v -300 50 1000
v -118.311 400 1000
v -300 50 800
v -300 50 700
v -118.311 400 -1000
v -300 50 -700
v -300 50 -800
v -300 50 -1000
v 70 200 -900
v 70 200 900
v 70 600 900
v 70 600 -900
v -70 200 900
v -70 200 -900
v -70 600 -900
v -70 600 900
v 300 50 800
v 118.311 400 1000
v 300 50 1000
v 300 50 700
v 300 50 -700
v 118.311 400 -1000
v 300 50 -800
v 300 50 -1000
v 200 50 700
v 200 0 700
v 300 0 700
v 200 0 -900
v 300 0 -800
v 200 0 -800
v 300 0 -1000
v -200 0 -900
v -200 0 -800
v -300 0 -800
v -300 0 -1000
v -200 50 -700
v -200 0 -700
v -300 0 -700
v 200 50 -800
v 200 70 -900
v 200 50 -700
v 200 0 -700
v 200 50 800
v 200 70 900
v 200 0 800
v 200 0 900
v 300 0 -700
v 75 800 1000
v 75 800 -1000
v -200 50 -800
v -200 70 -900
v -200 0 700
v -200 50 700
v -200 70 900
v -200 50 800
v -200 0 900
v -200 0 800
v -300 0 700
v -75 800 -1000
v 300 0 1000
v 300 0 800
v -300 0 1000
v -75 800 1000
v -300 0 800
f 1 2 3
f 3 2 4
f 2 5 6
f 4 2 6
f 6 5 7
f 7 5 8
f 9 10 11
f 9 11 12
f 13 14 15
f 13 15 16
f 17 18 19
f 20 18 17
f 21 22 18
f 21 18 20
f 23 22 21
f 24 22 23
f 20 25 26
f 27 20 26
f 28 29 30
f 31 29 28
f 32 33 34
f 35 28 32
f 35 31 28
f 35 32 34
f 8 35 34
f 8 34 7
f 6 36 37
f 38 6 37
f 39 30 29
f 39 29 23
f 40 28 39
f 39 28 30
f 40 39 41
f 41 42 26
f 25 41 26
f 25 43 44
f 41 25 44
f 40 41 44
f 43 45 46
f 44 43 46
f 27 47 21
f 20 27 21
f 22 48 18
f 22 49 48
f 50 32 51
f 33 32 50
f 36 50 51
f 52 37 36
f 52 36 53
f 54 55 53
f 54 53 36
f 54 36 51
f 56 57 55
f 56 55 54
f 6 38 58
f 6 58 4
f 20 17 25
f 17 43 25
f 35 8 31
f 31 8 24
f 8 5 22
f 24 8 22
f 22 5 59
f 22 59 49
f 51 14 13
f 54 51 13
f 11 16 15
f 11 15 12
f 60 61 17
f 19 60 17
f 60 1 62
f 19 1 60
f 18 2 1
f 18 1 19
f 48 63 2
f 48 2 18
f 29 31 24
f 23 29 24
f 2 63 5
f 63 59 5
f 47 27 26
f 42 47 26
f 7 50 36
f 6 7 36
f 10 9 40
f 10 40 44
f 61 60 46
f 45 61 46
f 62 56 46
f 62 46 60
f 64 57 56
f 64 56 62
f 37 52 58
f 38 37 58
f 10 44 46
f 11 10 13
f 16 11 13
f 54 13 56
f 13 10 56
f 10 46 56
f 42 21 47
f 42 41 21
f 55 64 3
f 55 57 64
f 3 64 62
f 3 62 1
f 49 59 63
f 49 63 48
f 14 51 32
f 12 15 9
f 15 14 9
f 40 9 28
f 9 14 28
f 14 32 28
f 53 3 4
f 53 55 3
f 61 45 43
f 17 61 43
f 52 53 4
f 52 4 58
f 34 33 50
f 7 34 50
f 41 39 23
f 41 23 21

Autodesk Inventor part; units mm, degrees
ref_plane "YZ Plane" through (0, 0, 0) normal (1, 0, 0) x (0, 1, 0)
ref_plane "XZ Plane" through (0, 0, 0) normal (0, 1, 0) x (-1, 0, 0)
ref_plane "XY Plane" through (0, 0, 0) normal (0, 0, 1) x (1, 0, 0)
sketch "Sketch1" plane through (0, 0, 0) normal (0, 0, 1) x (1, 0, 0)
  line L0 (0, 0) -> (0, 800) construction
  line L1 (0, 800) -> (-75, 800)
  line L2 (-300, 0) -> (-300, 50)
  line L3 (-75, 800) -> (-118.3113, 400)
  line L4 (-118.3113, 400) -> (-300, 50)
  line L5 (0, 800) -> (75, 800)
  line L6 (300, 0) -> (300, 50)
  line L7 (75, 800) -> (118.3113, 400)
  line L8 (118.3113, 400) -> (300, 50)
  line L9 (300, 0) -> (-300, 0)
  dimension "d28" = 800
extrude "Extrusion1" add sketch "Sketch1" along normal mid plane 2000
sketch "Sketch5" plane through (-300, 0, 1000) normal (0, -1, 0) x (1, 0, 0)
  line L0 (0, -2000) -> (181.6887, -2000) projected
  line L1 (0, -2000) -> (0, 0) projected
  line L2 (100, -1900) -> (100, -100)
  line L3 (181.6887, -2000) -> (181.6887, 0) projected
  line L4 (100, -1900) -> (500, -1900)
  line L5 (600, -2000) -> (600, 0) projected
  line L6 (500, -1900) -> (500, -100)
  line L7 (500, -100) -> (100, -100)
  point P0 (300, -1000)
  dimension "d35" = 1800
extrude "Extrusion5" cut sketch "Sketch5" against normal blind 200
chamfer "Chamfer1" distance 130 angle 45 2 edges at (200, 200, 0) (-200, 200, 0)
sketch "Sketch6" plane through (-300, 200, 1000) normal (0, -1, 0) x (1, 0, 0)
  line L0 (370, -100) -> (370, -1900) projected
  line L1 (370, -100) -> (370, -1900)
  line L2 (230, -1900) -> (230, -100) projected
  line L3 (370, -1900) -> (230, -1900)
  line L4 (230, -1900) -> (230, -100)
  line L5 (230, -100) -> (370, -100)
  point P0 (300, -1000)
extrude "Extrusion6" cut sketch "Sketch6" against normal blind 400
sketch "Sketch7" plane through (200, 0, -900) normal (-1, 0, 0) x (0, 0, 1)
  line L0 (0, 0) -> (0, 70) projected
  line L1 (0, 0) -> (100, 0)
  line L2 (1800, 0) -> (0, 0) projected
  line L3 (100, 0) -> (100, 50)
  line L4 (100, 50) -> (200, 50)
  line L5 (200, 50) -> (200, 0)
  line L6 (200, 0) -> (100, 0)
  line L7 (1800, 0) -> (1700, 0)
  line L8 (1700, 0) -> (1700, 50)
  line L9 (1700, 50) -> (1600, 50)
  line L10 (1600, 50) -> (1600, 0)
  line L11 (1600, 0) -> (1700, 0)
  point P0 (900, 0)
  point P1 (200, 0)
  dimension "d43" = 100
  dimension "d44" = 50
  dimension "d45" = 100
  dimension "d46" = 50
  dimension "d47" = 100
  dimension "d48" = 50
  dimension "d49" = 100
  dimension "d50" = 50
sketch "Sketch8" plane through (-200, 0, 900) normal (1, 0, 0) x (0, 0, -1)
  line L0 (1800, 0) -> (0, 0) projected
  line L1 (1800, 0) -> (1700, 0)
  line L2 (1700, 0) -> (1700, 50)
  line L3 (1700, 50) -> (1600, 50)
  line L4 (1600, 50) -> (1600, 0)
  line L5 (0, 0) -> (100, 0)
  line L6 (100, 0) -> (100, 50)
  line L7 (100, 50) -> (200, 50)
  line L8 (200, 50) -> (200, 0)
  line L9 (200, 0) -> (100, 0)
  point P0 (900, 0)
  dimension "d55" = 100
  dimension "d56" = 50
  dimension "d57" = 100
  dimension "d58" = 50
  dimension "d59" = 100
  dimension "d60" = 50
  dimension "d61" = 100
  dimension "d62" = 50
extrude "Extrusion7" cut sketch "Sketch8" against normal blind 100
extrude "Extrusion8" cut sketch "Sketch7" against normal blind 100
properties part number "Jersey Curb" material "Concrete"
